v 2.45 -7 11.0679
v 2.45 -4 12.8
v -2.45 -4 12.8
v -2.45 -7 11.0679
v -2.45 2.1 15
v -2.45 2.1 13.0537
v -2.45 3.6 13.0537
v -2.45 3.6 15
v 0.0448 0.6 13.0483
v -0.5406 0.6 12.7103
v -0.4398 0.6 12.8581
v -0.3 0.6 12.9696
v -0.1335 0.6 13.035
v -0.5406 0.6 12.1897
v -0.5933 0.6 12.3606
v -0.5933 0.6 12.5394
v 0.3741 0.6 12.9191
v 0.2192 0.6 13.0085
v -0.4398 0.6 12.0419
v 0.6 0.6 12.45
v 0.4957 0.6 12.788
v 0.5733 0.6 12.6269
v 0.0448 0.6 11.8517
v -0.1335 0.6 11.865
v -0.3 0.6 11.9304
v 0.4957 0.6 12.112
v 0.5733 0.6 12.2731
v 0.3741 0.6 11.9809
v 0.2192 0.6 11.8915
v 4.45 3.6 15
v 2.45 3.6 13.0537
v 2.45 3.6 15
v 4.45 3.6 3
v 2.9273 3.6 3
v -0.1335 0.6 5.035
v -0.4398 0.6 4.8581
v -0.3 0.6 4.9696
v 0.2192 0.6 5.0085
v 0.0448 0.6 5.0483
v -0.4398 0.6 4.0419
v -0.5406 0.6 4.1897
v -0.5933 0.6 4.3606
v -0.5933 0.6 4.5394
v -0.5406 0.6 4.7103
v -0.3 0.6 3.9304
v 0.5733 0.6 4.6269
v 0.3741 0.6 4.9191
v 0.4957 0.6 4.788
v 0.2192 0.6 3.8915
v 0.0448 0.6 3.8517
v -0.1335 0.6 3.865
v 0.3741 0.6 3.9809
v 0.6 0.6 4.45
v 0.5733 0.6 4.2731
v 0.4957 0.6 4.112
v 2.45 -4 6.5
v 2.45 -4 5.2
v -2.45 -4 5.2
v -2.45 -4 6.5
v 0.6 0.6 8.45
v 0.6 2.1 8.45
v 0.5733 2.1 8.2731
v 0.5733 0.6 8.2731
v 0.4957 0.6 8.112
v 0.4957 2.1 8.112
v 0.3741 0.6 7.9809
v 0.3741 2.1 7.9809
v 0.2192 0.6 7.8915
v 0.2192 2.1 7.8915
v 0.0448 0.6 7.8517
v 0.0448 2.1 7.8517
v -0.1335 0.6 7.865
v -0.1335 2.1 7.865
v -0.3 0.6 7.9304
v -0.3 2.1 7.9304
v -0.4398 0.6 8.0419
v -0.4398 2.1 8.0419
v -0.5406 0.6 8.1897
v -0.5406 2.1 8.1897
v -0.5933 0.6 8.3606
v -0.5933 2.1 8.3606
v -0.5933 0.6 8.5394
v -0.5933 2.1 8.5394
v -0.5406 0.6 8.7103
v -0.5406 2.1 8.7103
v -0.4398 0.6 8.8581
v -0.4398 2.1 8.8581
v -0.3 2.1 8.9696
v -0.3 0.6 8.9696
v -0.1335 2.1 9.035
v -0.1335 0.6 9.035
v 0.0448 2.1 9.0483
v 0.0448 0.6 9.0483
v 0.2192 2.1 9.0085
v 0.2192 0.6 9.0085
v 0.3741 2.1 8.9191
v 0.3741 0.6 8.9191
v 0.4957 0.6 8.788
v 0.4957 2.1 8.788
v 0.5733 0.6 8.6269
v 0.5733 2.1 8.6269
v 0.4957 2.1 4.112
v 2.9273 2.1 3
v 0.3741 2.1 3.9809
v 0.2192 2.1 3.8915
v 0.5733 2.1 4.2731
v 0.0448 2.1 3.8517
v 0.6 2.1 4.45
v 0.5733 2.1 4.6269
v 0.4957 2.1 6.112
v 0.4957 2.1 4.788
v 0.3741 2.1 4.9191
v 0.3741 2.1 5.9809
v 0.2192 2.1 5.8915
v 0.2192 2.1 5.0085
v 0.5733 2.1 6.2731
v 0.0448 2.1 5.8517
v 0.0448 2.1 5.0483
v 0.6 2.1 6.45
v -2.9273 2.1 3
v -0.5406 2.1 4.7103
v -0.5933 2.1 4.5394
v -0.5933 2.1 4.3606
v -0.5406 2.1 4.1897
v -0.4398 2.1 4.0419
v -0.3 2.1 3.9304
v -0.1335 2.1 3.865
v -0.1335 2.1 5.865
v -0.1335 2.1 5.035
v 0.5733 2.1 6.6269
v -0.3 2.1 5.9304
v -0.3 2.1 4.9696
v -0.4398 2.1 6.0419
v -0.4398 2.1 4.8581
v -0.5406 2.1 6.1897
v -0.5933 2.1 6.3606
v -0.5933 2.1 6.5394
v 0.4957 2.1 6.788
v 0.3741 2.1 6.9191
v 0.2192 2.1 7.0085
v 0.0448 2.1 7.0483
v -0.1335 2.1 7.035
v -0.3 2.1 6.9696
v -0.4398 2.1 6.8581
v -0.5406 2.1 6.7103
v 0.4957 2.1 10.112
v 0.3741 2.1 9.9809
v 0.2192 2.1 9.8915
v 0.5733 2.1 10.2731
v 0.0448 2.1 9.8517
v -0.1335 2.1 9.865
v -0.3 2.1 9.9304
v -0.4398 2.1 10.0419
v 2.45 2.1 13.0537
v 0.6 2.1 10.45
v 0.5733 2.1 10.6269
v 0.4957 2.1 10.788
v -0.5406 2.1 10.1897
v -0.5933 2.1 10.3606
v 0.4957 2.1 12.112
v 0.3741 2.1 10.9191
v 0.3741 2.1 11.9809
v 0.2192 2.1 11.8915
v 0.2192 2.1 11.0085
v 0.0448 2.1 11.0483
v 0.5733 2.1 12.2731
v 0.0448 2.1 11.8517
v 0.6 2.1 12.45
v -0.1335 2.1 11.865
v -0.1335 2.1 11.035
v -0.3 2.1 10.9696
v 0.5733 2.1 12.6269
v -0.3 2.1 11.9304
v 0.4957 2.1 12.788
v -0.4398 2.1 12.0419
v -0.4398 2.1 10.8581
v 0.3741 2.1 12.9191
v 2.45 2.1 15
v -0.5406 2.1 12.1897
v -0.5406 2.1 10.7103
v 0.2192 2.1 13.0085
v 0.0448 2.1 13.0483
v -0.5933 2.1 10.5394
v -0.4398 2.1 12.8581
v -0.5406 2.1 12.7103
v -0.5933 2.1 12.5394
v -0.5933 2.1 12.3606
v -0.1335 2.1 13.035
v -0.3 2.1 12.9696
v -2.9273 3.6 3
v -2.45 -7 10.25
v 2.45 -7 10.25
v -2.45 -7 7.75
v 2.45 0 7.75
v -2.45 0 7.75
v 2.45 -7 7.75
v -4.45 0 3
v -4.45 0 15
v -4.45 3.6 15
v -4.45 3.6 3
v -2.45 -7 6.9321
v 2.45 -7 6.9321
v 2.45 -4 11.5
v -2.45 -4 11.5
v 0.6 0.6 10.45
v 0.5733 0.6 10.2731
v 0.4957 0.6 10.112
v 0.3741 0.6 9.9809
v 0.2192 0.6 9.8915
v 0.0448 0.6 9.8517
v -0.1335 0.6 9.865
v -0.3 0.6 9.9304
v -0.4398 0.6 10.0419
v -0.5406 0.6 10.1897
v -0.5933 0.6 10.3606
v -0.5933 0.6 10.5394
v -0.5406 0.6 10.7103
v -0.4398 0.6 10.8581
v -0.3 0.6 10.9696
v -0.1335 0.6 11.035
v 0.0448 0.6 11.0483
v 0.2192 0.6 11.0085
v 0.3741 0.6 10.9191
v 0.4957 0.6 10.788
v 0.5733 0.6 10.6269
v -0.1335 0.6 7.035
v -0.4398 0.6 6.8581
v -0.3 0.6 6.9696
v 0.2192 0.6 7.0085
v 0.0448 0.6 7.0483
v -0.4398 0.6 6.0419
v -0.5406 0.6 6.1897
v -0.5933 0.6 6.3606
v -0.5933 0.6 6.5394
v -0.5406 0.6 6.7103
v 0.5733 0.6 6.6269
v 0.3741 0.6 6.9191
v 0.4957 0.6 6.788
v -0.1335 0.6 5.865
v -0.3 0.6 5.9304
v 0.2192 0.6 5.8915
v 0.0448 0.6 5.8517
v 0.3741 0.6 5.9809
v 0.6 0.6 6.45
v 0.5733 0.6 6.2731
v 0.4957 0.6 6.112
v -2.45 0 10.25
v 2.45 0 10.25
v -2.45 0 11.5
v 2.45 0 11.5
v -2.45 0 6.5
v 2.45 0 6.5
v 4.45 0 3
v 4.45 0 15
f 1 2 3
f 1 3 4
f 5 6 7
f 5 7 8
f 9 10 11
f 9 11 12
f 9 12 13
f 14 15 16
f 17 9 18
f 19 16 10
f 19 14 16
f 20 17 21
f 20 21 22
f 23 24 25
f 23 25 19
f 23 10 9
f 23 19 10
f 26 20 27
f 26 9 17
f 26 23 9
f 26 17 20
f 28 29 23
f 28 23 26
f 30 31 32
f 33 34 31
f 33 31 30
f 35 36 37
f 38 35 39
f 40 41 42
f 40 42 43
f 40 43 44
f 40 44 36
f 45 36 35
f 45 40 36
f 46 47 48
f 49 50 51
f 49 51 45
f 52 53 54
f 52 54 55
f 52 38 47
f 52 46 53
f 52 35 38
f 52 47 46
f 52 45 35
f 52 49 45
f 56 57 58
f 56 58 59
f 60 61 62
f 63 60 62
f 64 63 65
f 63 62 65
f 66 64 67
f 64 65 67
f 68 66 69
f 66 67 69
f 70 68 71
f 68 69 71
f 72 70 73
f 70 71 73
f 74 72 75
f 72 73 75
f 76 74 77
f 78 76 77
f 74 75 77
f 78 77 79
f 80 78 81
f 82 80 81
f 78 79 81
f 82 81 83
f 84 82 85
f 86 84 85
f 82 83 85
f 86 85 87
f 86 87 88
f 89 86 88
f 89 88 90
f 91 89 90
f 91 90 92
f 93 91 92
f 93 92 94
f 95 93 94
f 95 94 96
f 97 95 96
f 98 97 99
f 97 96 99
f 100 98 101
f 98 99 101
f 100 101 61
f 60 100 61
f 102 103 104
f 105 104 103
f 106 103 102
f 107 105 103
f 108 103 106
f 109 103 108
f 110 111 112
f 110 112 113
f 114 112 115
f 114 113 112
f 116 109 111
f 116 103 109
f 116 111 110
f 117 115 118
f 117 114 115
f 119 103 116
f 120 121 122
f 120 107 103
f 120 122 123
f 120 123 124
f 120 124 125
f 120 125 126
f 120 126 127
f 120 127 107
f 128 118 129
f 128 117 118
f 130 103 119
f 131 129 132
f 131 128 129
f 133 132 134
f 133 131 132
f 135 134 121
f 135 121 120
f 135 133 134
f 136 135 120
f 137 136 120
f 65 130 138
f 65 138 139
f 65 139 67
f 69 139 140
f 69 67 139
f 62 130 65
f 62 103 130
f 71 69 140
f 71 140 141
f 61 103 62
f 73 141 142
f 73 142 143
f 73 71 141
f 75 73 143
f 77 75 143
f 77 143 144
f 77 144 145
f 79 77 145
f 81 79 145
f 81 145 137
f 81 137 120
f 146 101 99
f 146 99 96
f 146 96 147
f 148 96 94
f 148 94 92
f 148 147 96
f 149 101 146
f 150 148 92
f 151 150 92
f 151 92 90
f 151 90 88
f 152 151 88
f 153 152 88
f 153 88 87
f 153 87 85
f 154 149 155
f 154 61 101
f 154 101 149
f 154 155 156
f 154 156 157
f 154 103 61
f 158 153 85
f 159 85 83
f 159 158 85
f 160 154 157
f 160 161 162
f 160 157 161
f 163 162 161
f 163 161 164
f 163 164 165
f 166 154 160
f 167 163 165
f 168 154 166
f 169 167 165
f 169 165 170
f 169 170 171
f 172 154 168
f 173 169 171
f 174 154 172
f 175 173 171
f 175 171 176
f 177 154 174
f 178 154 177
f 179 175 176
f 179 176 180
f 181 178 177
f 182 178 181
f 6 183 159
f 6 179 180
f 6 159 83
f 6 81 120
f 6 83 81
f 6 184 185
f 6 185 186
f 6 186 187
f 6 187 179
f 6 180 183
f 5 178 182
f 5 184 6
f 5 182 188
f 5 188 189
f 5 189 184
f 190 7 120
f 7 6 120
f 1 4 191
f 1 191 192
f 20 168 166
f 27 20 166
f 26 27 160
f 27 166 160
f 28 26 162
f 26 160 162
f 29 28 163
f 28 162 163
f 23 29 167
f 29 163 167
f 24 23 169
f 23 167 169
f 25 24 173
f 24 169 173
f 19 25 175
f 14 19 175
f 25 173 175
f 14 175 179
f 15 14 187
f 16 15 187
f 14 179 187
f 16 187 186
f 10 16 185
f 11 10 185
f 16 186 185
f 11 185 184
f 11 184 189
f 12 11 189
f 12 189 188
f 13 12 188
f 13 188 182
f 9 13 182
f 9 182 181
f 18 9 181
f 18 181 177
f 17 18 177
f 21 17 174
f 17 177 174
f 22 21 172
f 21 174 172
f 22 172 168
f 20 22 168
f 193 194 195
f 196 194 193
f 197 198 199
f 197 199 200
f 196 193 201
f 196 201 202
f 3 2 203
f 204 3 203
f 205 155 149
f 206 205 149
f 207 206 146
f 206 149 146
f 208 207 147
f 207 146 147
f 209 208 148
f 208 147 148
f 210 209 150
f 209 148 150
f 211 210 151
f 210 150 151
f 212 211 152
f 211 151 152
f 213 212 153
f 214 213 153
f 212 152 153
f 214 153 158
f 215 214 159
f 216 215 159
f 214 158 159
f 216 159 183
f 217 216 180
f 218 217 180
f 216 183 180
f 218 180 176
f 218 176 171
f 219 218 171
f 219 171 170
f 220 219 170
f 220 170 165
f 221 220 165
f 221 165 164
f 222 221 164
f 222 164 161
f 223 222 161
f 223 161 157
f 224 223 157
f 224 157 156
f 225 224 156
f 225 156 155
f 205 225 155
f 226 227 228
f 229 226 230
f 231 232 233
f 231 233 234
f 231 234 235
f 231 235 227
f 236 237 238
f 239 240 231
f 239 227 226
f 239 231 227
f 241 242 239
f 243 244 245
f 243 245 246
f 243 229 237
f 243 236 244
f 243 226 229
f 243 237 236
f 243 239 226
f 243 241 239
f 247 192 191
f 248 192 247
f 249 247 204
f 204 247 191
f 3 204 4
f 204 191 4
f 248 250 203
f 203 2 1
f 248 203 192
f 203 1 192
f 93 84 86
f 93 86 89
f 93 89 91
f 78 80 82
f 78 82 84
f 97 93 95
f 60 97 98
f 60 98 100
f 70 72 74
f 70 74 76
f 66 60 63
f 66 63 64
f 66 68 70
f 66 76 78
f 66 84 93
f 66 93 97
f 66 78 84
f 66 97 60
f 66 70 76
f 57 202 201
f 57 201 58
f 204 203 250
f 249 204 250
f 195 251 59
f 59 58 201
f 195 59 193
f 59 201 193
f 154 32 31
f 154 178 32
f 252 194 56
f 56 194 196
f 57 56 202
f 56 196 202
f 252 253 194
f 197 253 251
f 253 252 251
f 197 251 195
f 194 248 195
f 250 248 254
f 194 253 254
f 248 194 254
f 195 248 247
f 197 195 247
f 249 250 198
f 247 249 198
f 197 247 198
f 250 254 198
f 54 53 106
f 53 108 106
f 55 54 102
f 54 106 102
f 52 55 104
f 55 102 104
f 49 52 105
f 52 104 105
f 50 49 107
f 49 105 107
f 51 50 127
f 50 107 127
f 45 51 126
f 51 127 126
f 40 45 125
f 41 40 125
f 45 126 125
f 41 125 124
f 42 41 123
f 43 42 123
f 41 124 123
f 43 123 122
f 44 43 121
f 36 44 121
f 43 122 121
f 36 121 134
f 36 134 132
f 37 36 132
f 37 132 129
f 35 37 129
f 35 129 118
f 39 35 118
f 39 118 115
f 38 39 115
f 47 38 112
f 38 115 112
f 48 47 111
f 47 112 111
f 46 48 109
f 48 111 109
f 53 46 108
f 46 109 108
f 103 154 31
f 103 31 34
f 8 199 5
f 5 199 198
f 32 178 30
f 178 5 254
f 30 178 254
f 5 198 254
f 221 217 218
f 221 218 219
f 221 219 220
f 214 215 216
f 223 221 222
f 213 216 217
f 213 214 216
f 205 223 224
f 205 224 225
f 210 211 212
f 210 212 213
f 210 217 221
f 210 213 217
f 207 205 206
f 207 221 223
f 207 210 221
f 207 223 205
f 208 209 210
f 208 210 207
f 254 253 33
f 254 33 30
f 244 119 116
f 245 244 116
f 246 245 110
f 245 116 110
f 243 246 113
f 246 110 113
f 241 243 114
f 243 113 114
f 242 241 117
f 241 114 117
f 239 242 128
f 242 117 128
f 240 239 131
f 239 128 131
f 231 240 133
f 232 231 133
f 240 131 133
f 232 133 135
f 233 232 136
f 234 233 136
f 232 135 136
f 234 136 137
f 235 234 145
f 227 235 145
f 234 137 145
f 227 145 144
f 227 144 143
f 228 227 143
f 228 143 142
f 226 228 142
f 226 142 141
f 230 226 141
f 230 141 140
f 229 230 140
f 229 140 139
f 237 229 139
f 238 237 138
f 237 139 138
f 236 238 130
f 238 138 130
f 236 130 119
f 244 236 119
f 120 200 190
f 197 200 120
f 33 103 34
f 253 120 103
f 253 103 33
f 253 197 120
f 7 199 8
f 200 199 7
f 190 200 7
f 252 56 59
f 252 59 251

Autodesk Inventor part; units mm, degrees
ref_plane "YZ Plane" through (0, 0, 0) normal (1, 0, 0) x (0, 1, 0)
ref_plane "XZ Plane" through (0, 0, 0) normal (0, 1, 0) x (-1, 0, 0)
ref_plane "XY Plane" through (0, 0, 0) normal (0, 0, 1) x (1, 0, 0)
sketch "Sketch1" plane through (0, 0, 0) normal (0, 1, 0) x (-1, 0, 0)
  circle A0 centre (0, 0) radius 1.75
  circle A1 centre (0, 0) radius 2.45
  line L0 (0.95, 1.4697) -> (0.95, -1.4697)
  line L1 (1.5, 13) -> (-1.5, 13) construction
  line L2 (-1.5, 13) -> (-1.5, 5) construction
  line L3 (-1.5, 5) -> (1.5, 5) construction
  line L4 (1.5, 5) -> (1.5, 13) construction
  line L5 (0, 5) -> (0, 0) construction
  line L6 (2.45, 0) -> (2.45, 15)
  line L7 (2.45, 15) -> (-2.45, 15)
  line L8 (-2.45, 15) -> (-2.45, 0)
  line L9 (2.45, 0) -> (2.45, -2)
  line L10 (0.45, -4) -> (-0.45, -4)
  line L11 (-2.45, -2) -> (-2.45, 0)
  arc A2 (0.45, -4) -> (2.45, -2) centre (0.45, -2) ccw
  arc A3 (-2.45, -2) -> (-0.45, -4) centre (-0.45, -2) ccw
  line L12 (2.45, 3) -> (-2.45, 3)
  dimension "d0" = 3.5
  dimension "d1" = 4.9
  dimension "d3" = 3
  dimension "d4" = 8
  dimension "d5" = 5
  dimension "d6" = 2
  dimension "d15" = 2.7
  dimension "d24" = 4
  dimension "d25" = 2
  dimension "d28" = 2
extrude "Extrusion1" add sketch "Sketch1" along normal blind 2.1 contours L12 L8 L7 L6
sketch "Sketch2" plane through (0, 0, 0) normal (0, -1, 0) x (1, 0, 0)
  line L0 (2.45, 12.8) -> (-2.45, 12.8)
  line L1 (-2.45, 12.8) -> (-2.45, 5.2)
  line L2 (-2.45, 5.2) -> (2.45, 5.2)
  line L3 (2.45, 5.2) -> (2.45, 12.8)
  line L4 (0, 0) -> (0, 5.2) construction
  line L5 (2.45, 9) -> (-2.45, 9) construction
  line L6 (-2.45, 15) -> (2.45, 15) projected
  line L7 (2.45, 15) -> (2.45, 3) projected
  dimension "d10" = 7.6
extrude "Extrusion2" add sketch "Sketch2" along normal blind 7
sketch "Sketch3" plane through (2.45, 0, -3) normal (1, 0, 0) x (0, 0, -1)
  line L0 (-15.8, 0) -> (-15.8, -7) projected
  line L1 (-15.8, -4) -> (-14.0679, -7)
  line L2 (-13.25, -7) -> (-13.25, 0)
  line L3 (-13.25, 0) -> (-10.75, 0)
  line L4 (-10.75, 0) -> (-10.75, -7)
  line L5 (-10.75, -7) -> (-9.9321, -7)
  line L6 (-9.9321, -7) -> (-8.2, -4)
  line L7 (-8.2, -4) -> (-9.5, -4)
  line L8 (-9.5, -4) -> (-9.5, 0)
  line L9 (-8.2, 0) -> (-8.2, -7) projected
  line L10 (-9.5, 0) -> (-8.2, 0)
  line L11 (-13.25, -7) -> (-14.0679, -7)
  line L12 (-15.8, -4) -> (-14.5, -4)
  line L13 (-14.5, -4) -> (-14.5, 0)
  line L14 (-14.5, 0) -> (-15.8, 0)
  line L15 (-13.25, -7) -> (-12, -6.9306) construction
  line L16 (-10.75, -7) -> (-13.25, -7)
  line L17 (-8.2, -7) -> (-15.8, -7) projected
  line L18 (-15.8, 0) -> (-15.8, -7) projected
  line L19 (-15.8, -4) -> (-15.8, -7)
  line L20 (-15.8, -7) -> (-14.0679, -7)
  line L21 (-3, 0) -> (-8.2, 0) projected
  line L22 (-8.2, 0) -> (-8.2, -4)
  line L23 (-12, -6.9306) -> (-12, 0) construction
  line L24 (-9.5, -4) -> (-10.75, -4) construction
  line L25 (-14.5, -4) -> (-13.25, -4) construction
  line L26 (-6, 0) -> (-18, 0) projected
  line L27 (-17.9, 0) -> (-18, 0)
  line L28 (-18, 0) -> (-6, 0) projected
  line L29 (-6.1, 0) -> (-6, 0)
  point P0 (-9.9321, -7)
  point P1 (-18, 2.1)
  point P2 (-6, 2.1)
  point P3 (-18.8, 0)
  point P4 (-14.75, -6.5676)
  point P5 (-12.25, -5.8187)
  point P6 (-10.75, -7)
  dimension "d18" = 4
  dimension "d19" = 1.25
  dimension "d20" = 1.25
  dimension "d22" = 60
extrude "Extrusion5" cut sketch "Sketch3" against normal up to surface (4.9 mm away) contours L14 L13 L12 L0 | L1 L17 L0 | L3 L4 L16 L2 | L10 L9 L7 L8 | L6 L9 L17
sketch "Sketch5" plane through (0, 2.1, 0) normal (0, 1, 0) x (1, 0, 0)
  circle A0 centre (0, 0) radius 1.05
  circle A1 centre (0, 0) radius 3.45
  line L0 (2.3973, -14.1638) -> (2.9878, -1.725)
  line L1 (2.9878, -1.725) -> (2.3973, -14.1638)
  arc A2 (-2.3973, -14.1638) -> (2.3973, -14.1638) centre (0, -14.05) ccw
  line L2 (-2.3973, -14.1638) -> (-2.9878, -1.725)
  arc A3 (-2.3973, -14.1638) -> (2.3973, -14.1638) centre (0, -14.05) ccw
  circle A4 centre (0, -4.45) radius 0.25
  circle A5 centre (0, -4.45) radius 0.6 construction
  circle A6 centre (0, -6.45) radius 0.6 construction
  circle A7 centre (0, -6.45) radius 0.25
  circle A8 centre (0, -8.45) radius 0.25
  circle A9 centre (0, -8.45) radius 0.6 construction
  circle A10 centre (0, -10.45) radius 0.25
  circle A11 centre (0, -10.45) radius 0.6 construction
  circle A12 centre (0, -12.45) radius 0.25
  circle A13 centre (0, -12.45) radius 0.6 construction
  circle A14 centre (0, -14.45) radius 0.25
  circle A15 centre (0, -14.45) radius 0.6 construction
  line L3 (0, -11.65) -> (0, 0) construction
  line L4 (0, -4.45) -> (0, -6.45)
  line L5 (0, -6.45) -> (0, -8.45)
  line L6 (0, -8.45) -> (0, -10.45)
  line L7 (0, -10.45) -> (0, -12.45)
  line L8 (0, -12.45) -> (0, -14.45)
  line L9 (0, 0) -> (-2.9878, -1.725) construction
  line L10 (0, 0) -> (2.9878, -1.725) construction
  line L11 (-2.9878, -1.725) -> (0, -1.725) construction
  line L12 (2.9878, -1.725) -> (0, -1.725) construction
  line L13 (-4.45, -3) -> (4.45, -3)
  line L14 (4.45, -3) -> (4.45, -15)
  line L15 (4.45, -15) -> (-4.45, -15)
  line L16 (-4.45, -15) -> (-4.45, -3)
  line L17 (-2.45, -3) -> (-2.45, -15) projected
  line L18 (2.45, -15) -> (2.45, -3) projected
  line L19 (-2.45, -15) -> (2.45, -15) projected
  line L20 (2.45, -3) -> (-2.45, -3) projected
  point P0 (2.45, -13.0537)
  point P1 (2.204, -15)
  point P2 (-2.204, -15)
  point P3 (-2.45, -13.0537)
  point P4 (-2.9273, -3)
  point P5 (2.9273, -3)
  dimension "d34" = 2.1
  dimension "d35" = 6.9
  dimension "d36" = 2
  dimension "d37" = 0.5
  dimension "d38" = 2.4
  dimension "d39" = 0.4
  dimension "d41" = 60
  dimension "d42" = 4.45
  dimension "d43" = 2
  dimension "d44" = 2
  dimension "d49" = 1.2
extrude "Extrusion6" add sketch "Sketch5" along normal blind 1.5 and the other way blind 2.1 contours L2 L17 L15 L16 L13 | L13 L14 L15 L18 L0
sketch "Sketch7" plane through (0, 2.1, 0) normal (0, 1, 0) x (1, 0, 0)
  line L0 (-2.9273, -3) -> (-4.45, -3) projected
  line L1 (4.45, -15) -> (4.45, -3) projected
  line L2 (-4.45, -3) -> (4.45, -3)
  line L3 (4.45, -3) -> (4.45, -15)
  line L4 (4.45, -15) -> (-4.45, -15)
  line L5 (-4.45, -15) -> (-4.45, -3)
  point P0 (0, 0)
  point P1 (4.45, -3)
extrude "Extrusion8" add sketch "Sketch7" against normal blind 2.1
sketch "Sketch6" plane through (0, 2.1, 0) normal (0, 1, 0) x (1, 0, 0)
  circle A0 centre (0, 0) radius 1.05
  circle A1 centre (0, 0) radius 3.45
  circle A2 centre (0, -14.45) radius 0.6
  circle A3 centre (0, -14.45) radius 0.6 construction
  arc A4 (-1.997, -14.1591) -> (1.997, -14.1591) centre (0, -14.05) ccw
  arc A5 (-1.997, -14.1591) -> (1.997, -14.1591) centre (0, -14.05) ccw
  circle A6 centre (0, -4.45) radius 0.6
  circle A7 centre (0, -4.45) radius 0.6 construction
  circle A8 centre (0, -6.45) radius 0.6
  circle A9 centre (0, -8.45) radius 0.6
  circle A10 centre (0, -8.45) radius 0.6 construction
  line L0 (1.997, -14.1591) -> (2.65, -2.2091)
  line L1 (2.65, -2.2091) -> (1.997, -14.1591)
  line L2 (-1.997, -14.1591) -> (-2.65, -2.2091)
  circle A11 centre (0, -10.45) radius 0.6
  circle A12 centre (0, -10.45) radius 0.6 construction
  circle A13 centre (0, -12.45) radius 0.6
  circle A14 centre (0, -12.45) radius 0.6 construction
  circle A15 centre (0, -6.45) radius 0.6 construction
  line L3 (0, -12.05) -> (0, 0) construction
  line L4 (0, -4.45) -> (0, -6.45)
  line L5 (0, -6.45) -> (0, -8.45)
  line L6 (0, -8.45) -> (0, -10.45)
  line L7 (0, -10.45) -> (0, -12.45)
  line L8 (0, -12.45) -> (0, -14.45)
  line L9 (0, 0) -> (-2.65, -2.2091) construction
  line L10 (0, 0) -> (2.65, -2.2091) construction
  line L11 (-2.65, -2.2091) -> (0, -2.2091) construction
  line L12 (2.65, -2.2091) -> (0, -2.2091) construction
  line L13 (-4.45, -3) -> (4.45, -3)
  line L14 (4.45, -3) -> (4.45, -15)
  line L15 (4.45, -15) -> (-4.45, -15)
  line L16 (-4.45, -15) -> (-4.45, -3)
  line L17 (-2.45, -3) -> (-2.45, -15)
  line L18 (2.45, -15) -> (2.45, -3)
  line L19 (-2.45, -15) -> (2.45, -15)
  line L20 (2.45, -3) -> (-2.45, -3)
  point P0 (-0.2398, -15)
  point P1 (0.2398, -15)
  dimension "d50" = 2.1
  dimension "d51" = 6.9
  dimension "d52" = 2
  dimension "d53" = 1.2
  dimension "d54" = 2
  dimension "d55" = 0.4
  dimension "d56" = 50.185
  dimension "d57" = 4.45
  dimension "d58" = 2
  dimension "d59" = 2
  dimension "d60" = 1.2
extrude "Extrusion7" cut sketch "Sketch6" against normal blind 1.5 contours A6 | A8 L4 L5 | L5 L4 A8 | A9 L5 L6 | L6 L5 A9 | A11 L6 L7 | L7 L6 A11 | A13 L7 L8 | L8 L7 A13
properties part number "PlugConnectionBigServo"
